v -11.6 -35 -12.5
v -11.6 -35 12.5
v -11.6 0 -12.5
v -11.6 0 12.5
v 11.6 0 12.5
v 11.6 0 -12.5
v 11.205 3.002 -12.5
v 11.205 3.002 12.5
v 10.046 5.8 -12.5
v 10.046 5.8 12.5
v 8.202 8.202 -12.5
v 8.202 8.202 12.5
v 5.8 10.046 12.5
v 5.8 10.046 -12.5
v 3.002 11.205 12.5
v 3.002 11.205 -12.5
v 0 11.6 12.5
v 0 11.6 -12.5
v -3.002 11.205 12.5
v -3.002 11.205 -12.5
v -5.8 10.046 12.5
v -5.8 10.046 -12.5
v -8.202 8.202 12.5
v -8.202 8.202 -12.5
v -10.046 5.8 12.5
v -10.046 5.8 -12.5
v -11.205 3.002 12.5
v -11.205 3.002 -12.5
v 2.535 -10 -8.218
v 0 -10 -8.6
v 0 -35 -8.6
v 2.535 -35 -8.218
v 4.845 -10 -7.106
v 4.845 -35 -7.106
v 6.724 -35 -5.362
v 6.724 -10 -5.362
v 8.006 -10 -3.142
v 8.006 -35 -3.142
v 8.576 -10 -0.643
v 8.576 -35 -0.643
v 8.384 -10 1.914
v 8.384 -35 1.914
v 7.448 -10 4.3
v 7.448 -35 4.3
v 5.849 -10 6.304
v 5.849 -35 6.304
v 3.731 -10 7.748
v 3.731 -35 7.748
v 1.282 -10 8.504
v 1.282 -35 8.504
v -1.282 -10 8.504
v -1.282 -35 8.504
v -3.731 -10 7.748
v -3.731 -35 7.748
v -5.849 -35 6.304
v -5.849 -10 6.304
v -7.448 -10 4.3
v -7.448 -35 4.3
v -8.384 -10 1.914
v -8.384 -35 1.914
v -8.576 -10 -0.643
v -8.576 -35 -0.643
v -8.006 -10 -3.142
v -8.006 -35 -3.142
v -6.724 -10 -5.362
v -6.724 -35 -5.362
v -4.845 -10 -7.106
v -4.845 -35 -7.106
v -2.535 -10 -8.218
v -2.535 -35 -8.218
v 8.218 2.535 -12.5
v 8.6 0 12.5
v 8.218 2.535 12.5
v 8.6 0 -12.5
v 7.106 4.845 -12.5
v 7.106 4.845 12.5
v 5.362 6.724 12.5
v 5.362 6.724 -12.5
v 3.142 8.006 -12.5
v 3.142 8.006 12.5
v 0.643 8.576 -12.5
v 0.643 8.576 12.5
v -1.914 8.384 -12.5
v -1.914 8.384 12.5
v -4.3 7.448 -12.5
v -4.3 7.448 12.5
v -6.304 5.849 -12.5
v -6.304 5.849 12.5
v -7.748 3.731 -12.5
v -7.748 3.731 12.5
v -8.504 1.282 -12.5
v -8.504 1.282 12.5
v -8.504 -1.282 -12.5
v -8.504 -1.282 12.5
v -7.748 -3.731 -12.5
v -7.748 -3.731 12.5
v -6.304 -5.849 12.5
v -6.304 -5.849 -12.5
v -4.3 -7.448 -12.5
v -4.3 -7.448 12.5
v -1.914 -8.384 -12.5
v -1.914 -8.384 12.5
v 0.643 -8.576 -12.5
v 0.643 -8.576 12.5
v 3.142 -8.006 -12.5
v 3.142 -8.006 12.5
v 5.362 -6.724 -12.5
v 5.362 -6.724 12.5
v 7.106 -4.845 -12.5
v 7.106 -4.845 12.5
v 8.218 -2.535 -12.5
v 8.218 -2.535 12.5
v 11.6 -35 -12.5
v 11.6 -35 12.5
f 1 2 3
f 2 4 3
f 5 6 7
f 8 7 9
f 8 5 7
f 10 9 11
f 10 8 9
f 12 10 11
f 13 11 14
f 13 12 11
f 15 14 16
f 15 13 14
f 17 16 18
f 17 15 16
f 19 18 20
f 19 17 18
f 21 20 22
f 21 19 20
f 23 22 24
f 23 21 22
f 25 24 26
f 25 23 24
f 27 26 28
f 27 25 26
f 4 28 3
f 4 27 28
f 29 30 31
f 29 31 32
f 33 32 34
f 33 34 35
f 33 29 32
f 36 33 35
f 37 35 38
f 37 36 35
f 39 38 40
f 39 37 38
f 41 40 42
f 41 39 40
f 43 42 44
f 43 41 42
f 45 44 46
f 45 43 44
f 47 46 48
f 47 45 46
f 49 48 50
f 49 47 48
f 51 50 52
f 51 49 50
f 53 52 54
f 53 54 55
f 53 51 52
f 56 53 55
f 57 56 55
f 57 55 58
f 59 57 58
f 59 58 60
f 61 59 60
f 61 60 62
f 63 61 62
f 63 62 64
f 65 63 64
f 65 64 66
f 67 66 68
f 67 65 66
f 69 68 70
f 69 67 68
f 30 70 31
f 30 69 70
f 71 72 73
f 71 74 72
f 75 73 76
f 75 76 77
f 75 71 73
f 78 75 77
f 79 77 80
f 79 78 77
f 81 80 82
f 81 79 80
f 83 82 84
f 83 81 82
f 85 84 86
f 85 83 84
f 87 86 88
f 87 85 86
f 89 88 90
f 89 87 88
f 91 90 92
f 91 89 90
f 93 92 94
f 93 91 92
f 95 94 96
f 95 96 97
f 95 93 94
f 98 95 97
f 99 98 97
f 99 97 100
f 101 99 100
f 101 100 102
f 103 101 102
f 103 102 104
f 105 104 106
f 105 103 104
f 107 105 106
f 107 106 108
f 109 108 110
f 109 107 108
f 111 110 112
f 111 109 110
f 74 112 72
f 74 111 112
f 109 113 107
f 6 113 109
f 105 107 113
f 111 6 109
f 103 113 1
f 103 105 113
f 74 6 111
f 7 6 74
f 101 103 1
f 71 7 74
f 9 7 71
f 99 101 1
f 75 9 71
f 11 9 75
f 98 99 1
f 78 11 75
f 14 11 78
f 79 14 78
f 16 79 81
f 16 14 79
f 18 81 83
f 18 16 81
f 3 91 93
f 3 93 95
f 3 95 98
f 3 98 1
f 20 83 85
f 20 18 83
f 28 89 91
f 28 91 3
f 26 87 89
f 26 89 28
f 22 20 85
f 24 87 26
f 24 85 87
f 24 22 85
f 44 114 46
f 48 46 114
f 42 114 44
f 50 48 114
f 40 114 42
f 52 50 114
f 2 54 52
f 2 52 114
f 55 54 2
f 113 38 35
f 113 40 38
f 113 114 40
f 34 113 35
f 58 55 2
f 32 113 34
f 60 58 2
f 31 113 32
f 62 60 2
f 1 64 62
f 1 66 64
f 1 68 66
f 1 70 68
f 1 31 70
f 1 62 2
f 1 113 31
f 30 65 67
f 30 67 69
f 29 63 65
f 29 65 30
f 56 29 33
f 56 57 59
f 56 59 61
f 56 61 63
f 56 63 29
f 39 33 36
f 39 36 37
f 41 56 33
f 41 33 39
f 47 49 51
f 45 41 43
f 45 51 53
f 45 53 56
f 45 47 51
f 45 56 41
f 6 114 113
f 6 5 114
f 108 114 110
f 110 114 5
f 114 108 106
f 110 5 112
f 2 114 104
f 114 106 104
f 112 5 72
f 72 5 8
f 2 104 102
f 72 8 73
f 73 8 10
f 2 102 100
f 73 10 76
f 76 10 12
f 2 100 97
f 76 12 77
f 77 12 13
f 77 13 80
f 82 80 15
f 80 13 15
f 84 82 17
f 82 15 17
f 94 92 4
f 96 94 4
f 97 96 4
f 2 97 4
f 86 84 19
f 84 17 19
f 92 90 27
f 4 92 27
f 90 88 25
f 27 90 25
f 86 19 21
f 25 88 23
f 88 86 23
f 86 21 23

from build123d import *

# Parameters (mm, degrees)
CROQUIS1_R              = 8.6
SALIENTE_EXTRUIR1_DEPTH = 12.5
CROQUIS3_W              = 23.2
CROQUIS3_H              = 25
CROQUIS3_R              = 8.6
SALIENTE_EXTRUIR2_DEPTH = 25


with BuildPart() as part:
    # Croquis1 → Saliente-Extruir1 (new, symmetric)
    with BuildSketch(Plane.XY):
        with BuildLine():
            Line((-11.6, -10), (11.6, -10))
            Line((11.6, -10), (11.6, 0))
            ThreePointArc((11.6, 0), (0, 11.6), (-11.6, 0))
            Line((-11.6, 0), (-11.6, -10))
        make_face()
        Circle(CROQUIS1_R, mode=Mode.SUBTRACT)
    extrude(amount=SALIENTE_EXTRUIR1_DEPTH, both=True)

    # Croquis3 → Saliente-Extruir2 (add)
    with BuildSketch(Plane(origin=(0, -10, 0), x_dir=(-1, 0, 0), z_dir=(0, -1, 0))):
        Rectangle(CROQUIS3_W, CROQUIS3_H)
        with Locations(Location((0, 0, 0), (0, 0, 90))):
            Circle(CROQUIS3_R, mode=Mode.SUBTRACT)
    extrude(amount=SALIENTE_EXTRUIR2_DEPTH)


solid = part.part
